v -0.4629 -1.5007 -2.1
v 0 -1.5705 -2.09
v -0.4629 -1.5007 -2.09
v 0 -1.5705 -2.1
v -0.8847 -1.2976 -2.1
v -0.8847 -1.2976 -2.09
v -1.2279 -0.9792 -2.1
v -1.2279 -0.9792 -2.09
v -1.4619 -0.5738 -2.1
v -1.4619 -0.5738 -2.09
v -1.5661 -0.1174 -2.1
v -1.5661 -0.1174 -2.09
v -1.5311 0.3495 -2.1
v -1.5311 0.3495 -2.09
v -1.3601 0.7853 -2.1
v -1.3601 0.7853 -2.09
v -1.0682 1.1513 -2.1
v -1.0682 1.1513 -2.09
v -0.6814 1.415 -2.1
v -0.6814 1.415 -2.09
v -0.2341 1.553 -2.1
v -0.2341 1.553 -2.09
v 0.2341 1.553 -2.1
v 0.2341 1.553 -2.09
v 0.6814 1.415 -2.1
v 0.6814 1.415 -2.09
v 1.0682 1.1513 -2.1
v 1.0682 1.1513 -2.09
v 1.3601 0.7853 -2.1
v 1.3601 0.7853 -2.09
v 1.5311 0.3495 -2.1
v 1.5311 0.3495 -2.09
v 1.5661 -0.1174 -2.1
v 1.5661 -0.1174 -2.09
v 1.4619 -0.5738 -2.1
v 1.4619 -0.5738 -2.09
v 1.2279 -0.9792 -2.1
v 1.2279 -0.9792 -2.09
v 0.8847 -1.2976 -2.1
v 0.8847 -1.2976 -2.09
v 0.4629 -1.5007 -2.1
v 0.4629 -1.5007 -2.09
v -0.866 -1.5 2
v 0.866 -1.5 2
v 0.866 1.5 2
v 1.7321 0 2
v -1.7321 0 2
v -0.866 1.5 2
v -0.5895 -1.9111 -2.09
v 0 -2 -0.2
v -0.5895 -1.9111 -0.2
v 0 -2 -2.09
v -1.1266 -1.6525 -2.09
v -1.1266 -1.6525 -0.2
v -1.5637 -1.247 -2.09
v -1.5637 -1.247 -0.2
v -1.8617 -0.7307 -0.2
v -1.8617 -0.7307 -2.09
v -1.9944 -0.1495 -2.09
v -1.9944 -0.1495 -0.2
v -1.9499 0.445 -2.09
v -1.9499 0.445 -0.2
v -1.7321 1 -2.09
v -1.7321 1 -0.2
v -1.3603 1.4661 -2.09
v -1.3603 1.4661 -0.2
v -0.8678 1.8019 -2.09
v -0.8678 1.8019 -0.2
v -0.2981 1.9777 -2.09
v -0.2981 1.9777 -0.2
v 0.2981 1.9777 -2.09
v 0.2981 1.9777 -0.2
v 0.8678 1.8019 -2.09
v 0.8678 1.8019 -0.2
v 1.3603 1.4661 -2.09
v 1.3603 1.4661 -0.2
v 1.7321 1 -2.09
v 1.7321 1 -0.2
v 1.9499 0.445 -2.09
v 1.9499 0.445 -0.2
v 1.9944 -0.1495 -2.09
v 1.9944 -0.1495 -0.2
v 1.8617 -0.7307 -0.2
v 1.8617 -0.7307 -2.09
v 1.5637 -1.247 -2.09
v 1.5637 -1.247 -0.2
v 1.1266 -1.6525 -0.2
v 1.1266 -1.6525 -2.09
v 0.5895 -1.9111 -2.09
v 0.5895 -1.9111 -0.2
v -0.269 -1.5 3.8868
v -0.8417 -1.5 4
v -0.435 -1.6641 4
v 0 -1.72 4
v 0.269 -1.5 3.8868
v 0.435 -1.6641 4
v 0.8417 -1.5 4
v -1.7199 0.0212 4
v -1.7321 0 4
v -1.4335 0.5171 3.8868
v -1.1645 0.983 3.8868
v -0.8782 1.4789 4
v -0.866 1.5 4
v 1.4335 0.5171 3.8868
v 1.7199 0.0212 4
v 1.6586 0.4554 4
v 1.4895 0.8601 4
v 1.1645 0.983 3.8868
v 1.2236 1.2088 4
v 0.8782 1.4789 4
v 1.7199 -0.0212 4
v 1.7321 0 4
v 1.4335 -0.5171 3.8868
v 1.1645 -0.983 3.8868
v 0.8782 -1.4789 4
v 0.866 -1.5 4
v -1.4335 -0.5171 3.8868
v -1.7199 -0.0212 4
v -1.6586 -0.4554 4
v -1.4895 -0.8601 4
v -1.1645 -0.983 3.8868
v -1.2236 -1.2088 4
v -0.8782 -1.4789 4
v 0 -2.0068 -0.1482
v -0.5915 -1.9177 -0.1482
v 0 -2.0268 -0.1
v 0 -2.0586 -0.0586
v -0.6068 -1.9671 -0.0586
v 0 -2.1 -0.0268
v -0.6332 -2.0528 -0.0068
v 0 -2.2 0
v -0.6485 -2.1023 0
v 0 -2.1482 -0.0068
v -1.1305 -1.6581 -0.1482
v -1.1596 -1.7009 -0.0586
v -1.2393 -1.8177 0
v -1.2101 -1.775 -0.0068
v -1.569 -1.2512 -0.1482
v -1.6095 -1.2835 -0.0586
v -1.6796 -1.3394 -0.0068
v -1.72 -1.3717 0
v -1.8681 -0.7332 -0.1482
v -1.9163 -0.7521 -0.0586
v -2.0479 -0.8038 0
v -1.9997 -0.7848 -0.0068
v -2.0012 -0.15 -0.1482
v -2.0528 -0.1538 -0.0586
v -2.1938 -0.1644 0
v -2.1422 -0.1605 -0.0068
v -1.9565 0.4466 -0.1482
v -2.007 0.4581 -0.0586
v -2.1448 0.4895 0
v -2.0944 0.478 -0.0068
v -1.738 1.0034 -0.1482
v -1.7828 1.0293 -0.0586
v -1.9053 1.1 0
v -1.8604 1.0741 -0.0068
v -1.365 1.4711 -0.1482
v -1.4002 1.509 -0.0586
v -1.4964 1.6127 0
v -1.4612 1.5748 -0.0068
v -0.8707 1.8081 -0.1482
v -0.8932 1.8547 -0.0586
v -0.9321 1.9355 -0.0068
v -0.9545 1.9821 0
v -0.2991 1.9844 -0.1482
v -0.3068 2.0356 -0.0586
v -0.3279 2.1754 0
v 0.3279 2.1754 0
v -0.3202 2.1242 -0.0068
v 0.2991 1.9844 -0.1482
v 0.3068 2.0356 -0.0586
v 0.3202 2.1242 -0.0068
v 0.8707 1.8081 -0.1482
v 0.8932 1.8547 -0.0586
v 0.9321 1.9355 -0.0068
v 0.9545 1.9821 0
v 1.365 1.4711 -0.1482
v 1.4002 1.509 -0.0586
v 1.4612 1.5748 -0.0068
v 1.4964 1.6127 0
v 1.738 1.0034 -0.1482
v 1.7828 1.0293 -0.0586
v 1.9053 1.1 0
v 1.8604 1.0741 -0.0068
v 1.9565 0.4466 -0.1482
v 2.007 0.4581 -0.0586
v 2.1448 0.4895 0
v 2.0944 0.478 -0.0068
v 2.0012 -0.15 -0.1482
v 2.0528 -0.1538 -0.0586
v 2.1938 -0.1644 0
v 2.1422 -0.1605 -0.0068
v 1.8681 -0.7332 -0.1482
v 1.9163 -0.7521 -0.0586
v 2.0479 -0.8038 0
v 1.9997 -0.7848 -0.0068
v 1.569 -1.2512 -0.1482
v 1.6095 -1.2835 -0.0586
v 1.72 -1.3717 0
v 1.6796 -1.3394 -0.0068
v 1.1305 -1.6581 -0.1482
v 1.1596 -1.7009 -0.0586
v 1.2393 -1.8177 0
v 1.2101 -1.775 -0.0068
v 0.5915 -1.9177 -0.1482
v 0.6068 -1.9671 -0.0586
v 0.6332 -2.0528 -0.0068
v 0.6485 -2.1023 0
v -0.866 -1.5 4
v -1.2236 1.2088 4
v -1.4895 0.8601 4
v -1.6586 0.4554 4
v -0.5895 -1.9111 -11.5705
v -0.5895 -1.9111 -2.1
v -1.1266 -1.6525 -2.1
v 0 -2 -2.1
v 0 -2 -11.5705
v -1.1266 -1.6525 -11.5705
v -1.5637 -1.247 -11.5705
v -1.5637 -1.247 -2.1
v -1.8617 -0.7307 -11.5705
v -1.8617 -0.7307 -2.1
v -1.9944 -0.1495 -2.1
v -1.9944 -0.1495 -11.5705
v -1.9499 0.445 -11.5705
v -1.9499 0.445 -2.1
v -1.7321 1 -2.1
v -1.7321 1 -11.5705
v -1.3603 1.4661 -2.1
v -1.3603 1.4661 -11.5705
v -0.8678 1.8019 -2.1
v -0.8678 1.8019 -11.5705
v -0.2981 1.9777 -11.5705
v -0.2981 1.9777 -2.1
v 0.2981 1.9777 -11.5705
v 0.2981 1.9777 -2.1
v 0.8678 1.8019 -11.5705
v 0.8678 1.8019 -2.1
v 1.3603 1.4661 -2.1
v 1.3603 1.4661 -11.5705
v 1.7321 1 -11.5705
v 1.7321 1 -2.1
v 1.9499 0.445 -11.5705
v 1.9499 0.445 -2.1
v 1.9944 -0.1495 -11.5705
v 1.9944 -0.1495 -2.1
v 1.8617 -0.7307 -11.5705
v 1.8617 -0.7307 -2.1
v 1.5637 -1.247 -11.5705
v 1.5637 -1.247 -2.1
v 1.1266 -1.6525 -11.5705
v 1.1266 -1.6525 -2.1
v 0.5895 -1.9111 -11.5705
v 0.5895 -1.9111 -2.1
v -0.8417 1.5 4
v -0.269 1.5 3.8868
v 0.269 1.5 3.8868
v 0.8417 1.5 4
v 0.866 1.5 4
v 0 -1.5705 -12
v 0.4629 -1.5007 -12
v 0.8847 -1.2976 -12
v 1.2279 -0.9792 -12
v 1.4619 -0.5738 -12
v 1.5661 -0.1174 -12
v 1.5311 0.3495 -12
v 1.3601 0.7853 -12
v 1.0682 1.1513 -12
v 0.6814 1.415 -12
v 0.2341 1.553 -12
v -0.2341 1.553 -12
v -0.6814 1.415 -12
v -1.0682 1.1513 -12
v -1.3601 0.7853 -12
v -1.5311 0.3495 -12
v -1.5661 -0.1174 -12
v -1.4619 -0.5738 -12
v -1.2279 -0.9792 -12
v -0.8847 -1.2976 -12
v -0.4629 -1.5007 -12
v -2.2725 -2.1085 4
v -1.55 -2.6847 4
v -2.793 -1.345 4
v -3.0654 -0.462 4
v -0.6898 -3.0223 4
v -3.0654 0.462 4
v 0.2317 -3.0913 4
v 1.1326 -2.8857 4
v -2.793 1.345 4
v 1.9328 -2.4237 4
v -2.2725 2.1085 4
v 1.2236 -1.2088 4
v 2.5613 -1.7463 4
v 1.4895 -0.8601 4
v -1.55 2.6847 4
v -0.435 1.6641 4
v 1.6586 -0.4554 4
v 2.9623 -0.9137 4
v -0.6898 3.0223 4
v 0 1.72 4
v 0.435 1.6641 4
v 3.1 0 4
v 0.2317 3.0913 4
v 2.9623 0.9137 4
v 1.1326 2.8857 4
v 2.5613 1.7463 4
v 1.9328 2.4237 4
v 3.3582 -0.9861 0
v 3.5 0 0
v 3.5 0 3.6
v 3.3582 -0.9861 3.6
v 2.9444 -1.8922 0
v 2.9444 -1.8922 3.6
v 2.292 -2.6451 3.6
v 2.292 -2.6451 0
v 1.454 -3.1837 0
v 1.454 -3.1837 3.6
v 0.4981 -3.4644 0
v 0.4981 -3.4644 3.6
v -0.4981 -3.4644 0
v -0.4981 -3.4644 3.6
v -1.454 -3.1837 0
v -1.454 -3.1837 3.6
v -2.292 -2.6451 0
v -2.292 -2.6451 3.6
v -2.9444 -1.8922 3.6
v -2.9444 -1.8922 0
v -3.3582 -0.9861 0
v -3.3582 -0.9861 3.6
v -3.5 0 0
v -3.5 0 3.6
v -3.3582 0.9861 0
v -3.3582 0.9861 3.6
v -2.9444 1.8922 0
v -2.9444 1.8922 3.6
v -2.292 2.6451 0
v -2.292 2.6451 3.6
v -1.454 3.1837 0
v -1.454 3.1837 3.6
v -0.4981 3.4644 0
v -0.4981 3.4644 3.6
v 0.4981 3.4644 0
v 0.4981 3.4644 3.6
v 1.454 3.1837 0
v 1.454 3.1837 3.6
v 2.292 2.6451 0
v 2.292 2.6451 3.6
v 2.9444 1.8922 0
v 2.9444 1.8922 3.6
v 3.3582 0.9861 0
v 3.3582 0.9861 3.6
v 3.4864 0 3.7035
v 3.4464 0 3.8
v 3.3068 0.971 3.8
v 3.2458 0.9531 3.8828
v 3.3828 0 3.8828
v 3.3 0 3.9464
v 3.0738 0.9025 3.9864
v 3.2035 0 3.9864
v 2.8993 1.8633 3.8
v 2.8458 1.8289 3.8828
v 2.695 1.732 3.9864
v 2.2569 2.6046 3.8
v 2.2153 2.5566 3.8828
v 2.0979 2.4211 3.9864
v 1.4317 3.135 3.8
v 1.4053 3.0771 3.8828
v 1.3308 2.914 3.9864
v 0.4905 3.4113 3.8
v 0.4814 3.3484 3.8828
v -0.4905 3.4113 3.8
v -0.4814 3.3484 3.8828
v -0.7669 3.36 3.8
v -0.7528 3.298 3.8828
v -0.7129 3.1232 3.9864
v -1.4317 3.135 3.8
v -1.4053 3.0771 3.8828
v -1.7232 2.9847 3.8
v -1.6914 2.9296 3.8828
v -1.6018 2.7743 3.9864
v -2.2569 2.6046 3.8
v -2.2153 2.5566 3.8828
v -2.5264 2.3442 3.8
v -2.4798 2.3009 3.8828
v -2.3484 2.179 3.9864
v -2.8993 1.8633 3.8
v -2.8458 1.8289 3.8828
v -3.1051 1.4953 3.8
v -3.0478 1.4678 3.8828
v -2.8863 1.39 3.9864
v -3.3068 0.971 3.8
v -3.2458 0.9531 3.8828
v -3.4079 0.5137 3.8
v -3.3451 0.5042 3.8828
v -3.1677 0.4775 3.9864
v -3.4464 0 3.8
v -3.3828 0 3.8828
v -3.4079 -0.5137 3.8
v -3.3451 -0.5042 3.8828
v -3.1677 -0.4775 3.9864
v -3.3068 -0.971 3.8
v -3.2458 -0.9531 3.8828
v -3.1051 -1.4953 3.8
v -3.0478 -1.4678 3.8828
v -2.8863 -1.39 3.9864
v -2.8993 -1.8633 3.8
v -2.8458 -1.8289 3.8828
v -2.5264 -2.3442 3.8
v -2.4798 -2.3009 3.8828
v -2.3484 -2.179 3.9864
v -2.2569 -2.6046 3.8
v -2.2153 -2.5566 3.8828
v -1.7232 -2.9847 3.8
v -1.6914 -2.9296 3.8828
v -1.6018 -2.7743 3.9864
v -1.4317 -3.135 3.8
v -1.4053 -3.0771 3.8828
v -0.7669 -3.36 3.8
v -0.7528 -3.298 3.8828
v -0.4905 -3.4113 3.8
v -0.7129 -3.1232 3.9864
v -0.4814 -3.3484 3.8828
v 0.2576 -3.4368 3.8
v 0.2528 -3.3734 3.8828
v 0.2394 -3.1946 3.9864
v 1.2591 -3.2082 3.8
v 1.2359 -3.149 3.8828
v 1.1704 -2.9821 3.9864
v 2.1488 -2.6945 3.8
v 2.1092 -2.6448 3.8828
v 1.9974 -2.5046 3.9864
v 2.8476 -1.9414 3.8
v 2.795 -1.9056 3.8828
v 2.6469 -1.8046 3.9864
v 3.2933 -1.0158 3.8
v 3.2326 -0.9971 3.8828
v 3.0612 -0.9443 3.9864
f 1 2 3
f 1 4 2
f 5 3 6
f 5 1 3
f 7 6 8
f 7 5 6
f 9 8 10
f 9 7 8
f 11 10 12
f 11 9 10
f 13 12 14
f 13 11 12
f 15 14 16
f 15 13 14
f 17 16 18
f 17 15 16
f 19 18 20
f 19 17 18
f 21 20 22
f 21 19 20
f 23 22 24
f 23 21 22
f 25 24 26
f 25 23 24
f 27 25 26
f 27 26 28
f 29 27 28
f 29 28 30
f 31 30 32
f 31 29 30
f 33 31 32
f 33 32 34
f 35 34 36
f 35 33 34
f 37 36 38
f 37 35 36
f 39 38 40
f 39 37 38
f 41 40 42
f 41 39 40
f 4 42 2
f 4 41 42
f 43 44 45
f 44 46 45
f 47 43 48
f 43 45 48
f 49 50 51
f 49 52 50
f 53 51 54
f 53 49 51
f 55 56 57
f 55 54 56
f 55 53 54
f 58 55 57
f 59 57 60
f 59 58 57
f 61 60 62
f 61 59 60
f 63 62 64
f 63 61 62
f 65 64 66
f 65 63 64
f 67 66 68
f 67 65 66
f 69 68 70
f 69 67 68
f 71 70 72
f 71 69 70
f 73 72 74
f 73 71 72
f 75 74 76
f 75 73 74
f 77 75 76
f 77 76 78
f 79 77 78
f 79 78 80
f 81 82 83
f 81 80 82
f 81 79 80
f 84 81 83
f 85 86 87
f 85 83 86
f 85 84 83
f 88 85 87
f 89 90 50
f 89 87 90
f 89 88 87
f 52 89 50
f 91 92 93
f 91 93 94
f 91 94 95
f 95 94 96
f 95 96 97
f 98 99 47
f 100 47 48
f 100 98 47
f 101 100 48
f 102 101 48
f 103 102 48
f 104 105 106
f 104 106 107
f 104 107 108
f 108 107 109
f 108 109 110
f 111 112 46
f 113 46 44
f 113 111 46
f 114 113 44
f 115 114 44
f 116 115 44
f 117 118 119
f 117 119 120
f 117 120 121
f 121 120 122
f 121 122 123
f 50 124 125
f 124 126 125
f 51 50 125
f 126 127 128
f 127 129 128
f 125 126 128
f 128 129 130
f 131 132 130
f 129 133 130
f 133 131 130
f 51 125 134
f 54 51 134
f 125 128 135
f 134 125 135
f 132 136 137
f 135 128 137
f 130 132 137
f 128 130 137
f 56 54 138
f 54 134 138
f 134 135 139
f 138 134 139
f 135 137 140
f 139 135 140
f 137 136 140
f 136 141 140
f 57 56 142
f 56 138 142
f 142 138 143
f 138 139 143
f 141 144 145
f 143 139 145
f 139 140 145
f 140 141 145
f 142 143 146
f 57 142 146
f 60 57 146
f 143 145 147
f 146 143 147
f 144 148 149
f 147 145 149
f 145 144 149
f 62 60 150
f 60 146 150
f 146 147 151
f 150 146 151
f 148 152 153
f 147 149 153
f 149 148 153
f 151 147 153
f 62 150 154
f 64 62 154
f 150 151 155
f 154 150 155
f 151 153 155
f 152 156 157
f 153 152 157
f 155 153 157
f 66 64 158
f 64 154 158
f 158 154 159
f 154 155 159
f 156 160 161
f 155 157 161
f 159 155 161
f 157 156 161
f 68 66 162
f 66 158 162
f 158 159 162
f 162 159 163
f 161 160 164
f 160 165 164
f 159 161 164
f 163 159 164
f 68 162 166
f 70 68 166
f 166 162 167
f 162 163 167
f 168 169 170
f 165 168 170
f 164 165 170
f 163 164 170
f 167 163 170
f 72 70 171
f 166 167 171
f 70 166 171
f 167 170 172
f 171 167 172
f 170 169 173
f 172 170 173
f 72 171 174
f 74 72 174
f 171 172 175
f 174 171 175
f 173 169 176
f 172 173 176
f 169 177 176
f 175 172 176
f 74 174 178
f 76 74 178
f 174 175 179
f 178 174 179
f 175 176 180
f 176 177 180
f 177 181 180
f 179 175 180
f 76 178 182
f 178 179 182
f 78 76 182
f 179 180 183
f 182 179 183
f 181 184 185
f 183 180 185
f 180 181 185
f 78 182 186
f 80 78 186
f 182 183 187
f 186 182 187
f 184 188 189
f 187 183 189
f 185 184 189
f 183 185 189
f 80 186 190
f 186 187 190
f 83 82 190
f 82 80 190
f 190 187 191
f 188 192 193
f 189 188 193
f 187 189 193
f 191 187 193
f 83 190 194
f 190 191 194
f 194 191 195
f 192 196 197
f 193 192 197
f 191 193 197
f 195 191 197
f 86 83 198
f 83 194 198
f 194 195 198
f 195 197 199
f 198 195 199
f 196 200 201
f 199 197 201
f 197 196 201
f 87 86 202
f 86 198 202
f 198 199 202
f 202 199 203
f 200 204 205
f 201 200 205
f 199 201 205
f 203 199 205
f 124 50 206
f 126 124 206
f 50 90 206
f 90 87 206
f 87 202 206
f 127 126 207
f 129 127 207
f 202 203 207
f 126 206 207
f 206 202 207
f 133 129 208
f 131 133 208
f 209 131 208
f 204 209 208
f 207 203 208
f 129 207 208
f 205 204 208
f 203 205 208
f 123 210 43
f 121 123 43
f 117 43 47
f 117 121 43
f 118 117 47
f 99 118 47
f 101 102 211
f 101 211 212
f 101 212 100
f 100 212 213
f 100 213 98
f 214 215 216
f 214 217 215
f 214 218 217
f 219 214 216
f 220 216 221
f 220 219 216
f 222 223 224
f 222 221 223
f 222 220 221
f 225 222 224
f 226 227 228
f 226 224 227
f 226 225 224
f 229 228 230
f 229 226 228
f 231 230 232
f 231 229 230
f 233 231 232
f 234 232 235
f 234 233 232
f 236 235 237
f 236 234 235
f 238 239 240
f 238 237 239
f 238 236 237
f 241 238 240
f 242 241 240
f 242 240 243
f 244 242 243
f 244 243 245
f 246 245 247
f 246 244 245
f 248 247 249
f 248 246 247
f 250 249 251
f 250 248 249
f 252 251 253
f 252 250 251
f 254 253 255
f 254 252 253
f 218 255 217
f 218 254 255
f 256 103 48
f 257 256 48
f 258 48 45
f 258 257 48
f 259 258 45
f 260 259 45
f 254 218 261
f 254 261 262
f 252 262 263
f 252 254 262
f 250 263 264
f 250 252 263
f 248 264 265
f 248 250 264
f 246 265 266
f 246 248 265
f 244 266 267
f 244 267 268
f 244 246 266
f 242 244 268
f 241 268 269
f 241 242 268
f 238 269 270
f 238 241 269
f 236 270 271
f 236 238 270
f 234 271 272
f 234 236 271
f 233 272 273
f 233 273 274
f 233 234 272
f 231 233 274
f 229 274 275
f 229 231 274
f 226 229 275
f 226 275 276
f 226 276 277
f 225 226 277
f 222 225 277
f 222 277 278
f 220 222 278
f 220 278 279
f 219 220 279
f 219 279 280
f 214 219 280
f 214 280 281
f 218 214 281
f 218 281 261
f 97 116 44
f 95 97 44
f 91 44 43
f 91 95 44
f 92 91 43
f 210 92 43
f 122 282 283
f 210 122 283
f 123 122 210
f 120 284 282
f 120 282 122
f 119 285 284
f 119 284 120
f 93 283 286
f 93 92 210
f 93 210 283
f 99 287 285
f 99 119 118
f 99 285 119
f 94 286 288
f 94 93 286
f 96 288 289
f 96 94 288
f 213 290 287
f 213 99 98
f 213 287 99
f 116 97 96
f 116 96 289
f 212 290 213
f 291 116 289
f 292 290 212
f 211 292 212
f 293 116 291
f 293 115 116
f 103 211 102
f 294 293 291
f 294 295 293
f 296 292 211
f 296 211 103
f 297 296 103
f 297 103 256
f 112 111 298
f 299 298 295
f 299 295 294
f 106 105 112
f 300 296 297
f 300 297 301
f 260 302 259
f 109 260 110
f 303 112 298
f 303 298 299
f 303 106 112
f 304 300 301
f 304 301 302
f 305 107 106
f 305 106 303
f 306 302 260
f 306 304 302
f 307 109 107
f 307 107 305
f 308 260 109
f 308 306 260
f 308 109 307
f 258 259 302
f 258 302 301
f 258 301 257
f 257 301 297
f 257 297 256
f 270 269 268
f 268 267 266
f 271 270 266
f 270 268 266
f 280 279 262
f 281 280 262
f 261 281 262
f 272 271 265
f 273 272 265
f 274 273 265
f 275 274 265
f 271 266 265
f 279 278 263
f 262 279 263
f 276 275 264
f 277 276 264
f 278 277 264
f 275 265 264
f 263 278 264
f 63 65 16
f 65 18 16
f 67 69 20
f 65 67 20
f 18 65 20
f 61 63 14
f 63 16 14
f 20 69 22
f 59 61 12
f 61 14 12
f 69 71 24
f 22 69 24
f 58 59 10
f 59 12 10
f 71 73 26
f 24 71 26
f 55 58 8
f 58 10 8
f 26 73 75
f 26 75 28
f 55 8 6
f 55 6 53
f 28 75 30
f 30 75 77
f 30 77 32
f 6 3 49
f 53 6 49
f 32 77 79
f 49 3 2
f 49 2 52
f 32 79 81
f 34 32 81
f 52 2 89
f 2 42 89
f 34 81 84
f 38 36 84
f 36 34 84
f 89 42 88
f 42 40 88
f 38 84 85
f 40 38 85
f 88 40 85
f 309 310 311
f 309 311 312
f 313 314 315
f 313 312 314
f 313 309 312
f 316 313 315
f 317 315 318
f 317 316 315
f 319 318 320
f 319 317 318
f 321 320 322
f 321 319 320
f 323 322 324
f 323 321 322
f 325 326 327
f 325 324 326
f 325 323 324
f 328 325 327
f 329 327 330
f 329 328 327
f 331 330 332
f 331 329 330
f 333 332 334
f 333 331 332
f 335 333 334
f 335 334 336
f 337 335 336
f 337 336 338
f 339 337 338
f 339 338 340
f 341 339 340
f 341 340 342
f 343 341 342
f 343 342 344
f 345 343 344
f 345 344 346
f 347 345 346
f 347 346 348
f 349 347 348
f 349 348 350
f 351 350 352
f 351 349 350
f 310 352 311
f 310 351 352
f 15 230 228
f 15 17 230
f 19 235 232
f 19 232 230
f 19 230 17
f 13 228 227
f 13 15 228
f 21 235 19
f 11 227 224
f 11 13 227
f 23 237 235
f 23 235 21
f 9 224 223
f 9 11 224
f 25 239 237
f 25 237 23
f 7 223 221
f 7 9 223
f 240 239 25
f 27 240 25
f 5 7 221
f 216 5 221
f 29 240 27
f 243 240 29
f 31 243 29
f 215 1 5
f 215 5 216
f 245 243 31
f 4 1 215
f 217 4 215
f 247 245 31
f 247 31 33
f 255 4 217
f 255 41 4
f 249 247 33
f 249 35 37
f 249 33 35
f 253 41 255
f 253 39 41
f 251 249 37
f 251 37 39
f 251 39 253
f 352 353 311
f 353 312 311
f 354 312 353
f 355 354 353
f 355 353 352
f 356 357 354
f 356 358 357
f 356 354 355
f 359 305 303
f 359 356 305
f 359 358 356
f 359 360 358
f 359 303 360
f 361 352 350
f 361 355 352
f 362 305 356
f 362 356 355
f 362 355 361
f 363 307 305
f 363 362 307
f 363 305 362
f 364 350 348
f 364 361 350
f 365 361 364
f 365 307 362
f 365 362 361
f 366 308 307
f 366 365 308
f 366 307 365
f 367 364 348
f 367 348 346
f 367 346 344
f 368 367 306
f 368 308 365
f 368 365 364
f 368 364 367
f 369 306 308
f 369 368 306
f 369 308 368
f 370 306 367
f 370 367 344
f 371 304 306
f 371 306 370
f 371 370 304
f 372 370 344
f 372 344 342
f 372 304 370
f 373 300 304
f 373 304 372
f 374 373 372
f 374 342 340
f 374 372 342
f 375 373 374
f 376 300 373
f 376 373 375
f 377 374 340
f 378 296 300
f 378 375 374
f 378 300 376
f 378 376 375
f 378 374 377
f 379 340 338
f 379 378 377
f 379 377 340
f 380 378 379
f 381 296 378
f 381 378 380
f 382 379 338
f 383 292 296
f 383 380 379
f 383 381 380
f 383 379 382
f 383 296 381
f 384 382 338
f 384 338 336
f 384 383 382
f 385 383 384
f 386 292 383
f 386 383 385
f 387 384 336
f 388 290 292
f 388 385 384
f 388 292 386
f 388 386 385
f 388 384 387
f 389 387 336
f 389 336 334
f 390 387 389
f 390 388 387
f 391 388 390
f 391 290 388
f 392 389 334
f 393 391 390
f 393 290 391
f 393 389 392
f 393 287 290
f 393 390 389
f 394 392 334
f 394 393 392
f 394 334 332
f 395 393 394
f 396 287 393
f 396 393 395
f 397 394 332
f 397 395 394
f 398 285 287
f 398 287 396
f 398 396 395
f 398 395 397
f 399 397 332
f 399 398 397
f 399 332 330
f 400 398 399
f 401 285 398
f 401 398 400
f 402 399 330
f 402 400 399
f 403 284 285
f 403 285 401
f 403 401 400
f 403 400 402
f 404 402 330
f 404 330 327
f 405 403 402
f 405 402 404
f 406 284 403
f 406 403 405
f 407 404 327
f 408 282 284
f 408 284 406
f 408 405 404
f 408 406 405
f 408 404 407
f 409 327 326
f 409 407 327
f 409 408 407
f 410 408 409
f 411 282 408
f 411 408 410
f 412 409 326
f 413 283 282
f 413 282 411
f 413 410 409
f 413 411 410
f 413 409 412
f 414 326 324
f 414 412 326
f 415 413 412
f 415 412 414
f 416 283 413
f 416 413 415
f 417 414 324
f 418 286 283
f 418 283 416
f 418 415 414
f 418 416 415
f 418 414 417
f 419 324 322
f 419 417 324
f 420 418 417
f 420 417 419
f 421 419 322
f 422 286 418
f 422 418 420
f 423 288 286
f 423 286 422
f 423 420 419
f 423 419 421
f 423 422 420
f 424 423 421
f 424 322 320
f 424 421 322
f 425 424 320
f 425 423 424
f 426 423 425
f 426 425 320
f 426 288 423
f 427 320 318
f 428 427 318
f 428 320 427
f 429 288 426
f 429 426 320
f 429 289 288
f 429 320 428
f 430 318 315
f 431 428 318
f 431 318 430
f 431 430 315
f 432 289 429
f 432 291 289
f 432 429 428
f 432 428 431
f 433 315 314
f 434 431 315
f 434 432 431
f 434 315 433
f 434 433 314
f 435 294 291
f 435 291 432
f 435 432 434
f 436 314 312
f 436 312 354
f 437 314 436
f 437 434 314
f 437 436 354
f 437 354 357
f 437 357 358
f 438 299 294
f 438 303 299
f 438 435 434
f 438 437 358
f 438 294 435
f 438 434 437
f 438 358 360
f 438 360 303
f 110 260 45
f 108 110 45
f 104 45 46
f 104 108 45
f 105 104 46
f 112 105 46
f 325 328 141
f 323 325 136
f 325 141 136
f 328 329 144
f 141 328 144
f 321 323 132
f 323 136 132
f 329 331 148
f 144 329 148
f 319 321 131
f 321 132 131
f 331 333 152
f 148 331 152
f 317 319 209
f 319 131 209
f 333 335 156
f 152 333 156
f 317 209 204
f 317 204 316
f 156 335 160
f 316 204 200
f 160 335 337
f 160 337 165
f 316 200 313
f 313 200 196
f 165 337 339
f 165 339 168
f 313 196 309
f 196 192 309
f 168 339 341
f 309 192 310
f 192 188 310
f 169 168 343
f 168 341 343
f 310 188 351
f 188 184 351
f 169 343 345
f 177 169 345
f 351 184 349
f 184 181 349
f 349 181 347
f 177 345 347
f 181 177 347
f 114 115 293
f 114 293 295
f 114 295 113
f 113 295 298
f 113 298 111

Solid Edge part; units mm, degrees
sketch "Sketch1" plane through (0, 0, 0) normal (0, 0, 1) x (1, 0, 0)
  circle A0 centre (0, 0) radius 3.5
extrude "Protrusion1" add sketch "Sketch1" along normal blind 4
sketch "Sketch2" plane through (0, 0, 4) normal (0, 0, 1) x (0, 1, 0)
  line L0 (0, 1.7321) -> (1.5, 0.866)
  line L1 (1.5, 0.866) -> (1.5, -0.866)
  line L2 (1.5, -0.866) -> (0, -1.7321)
  line L3 (0, -1.7321) -> (-1.5, -0.866)
  line L4 (-1.5, -0.866) -> (-1.5, 0.866)
  line L5 (-1.5, 0.866) -> (0, 1.7321)
extrude "Cutout1" cut sketch "Sketch2" against normal blind 2
fillet "Round1" radius 0.4 1 edges at (-3.5, 0, 4)
sketch "Sketch3" plane through (0, 0, 0) normal (1, 0, 0) x (0, 1, 0)
  line L0 (-1.5705, -12) -> (0, -12)
  line L1 (-2, -11.5705) -> (-1.5705, -12)
  line L2 (-2, -2.1) -> (-2, -11.5705)
  line L3 (-1.5705, -2.1) -> (-2, -2.1)
  line L4 (-1.5705, -2.09) -> (-1.5705, -2.1)
  line L5 (-2, -2.09) -> (-1.5705, -2.09)
  line L6 (-2, -0.2) -> (-2, -2.09)
  arc A0 (-2, -0.2) -> (-2.2, 0) centre (-2.2, -0.2) ccw
  dimension "D1" = 2.1
  dimension "D2" = 0.01
  dimension "D3" = 0.2
  dimension "D4" = 12
revolve "RevolvedProtrusion1" add sketch "Sketch3" angle 360 about axis through (0, 0, -60.325) along (0, 0, 1) material side at (0, -0.7853, -11.95)
cosmetic_thread "Thread1" size "M4"
sketch "Sketch4" plane through (0, 0, 0) normal (0, -1, 0) x (1, 0, 0)
  line L0 (-1.72, 4) -> (0, 3.007)
revolve "RevolvedCutout1" cut sketch "Sketch4" angle 360 about axis through (0, 0, 57.15) along (0, 0, -1) material side at (-0.835, 0, 3.5468)
properties material "Stahl"
